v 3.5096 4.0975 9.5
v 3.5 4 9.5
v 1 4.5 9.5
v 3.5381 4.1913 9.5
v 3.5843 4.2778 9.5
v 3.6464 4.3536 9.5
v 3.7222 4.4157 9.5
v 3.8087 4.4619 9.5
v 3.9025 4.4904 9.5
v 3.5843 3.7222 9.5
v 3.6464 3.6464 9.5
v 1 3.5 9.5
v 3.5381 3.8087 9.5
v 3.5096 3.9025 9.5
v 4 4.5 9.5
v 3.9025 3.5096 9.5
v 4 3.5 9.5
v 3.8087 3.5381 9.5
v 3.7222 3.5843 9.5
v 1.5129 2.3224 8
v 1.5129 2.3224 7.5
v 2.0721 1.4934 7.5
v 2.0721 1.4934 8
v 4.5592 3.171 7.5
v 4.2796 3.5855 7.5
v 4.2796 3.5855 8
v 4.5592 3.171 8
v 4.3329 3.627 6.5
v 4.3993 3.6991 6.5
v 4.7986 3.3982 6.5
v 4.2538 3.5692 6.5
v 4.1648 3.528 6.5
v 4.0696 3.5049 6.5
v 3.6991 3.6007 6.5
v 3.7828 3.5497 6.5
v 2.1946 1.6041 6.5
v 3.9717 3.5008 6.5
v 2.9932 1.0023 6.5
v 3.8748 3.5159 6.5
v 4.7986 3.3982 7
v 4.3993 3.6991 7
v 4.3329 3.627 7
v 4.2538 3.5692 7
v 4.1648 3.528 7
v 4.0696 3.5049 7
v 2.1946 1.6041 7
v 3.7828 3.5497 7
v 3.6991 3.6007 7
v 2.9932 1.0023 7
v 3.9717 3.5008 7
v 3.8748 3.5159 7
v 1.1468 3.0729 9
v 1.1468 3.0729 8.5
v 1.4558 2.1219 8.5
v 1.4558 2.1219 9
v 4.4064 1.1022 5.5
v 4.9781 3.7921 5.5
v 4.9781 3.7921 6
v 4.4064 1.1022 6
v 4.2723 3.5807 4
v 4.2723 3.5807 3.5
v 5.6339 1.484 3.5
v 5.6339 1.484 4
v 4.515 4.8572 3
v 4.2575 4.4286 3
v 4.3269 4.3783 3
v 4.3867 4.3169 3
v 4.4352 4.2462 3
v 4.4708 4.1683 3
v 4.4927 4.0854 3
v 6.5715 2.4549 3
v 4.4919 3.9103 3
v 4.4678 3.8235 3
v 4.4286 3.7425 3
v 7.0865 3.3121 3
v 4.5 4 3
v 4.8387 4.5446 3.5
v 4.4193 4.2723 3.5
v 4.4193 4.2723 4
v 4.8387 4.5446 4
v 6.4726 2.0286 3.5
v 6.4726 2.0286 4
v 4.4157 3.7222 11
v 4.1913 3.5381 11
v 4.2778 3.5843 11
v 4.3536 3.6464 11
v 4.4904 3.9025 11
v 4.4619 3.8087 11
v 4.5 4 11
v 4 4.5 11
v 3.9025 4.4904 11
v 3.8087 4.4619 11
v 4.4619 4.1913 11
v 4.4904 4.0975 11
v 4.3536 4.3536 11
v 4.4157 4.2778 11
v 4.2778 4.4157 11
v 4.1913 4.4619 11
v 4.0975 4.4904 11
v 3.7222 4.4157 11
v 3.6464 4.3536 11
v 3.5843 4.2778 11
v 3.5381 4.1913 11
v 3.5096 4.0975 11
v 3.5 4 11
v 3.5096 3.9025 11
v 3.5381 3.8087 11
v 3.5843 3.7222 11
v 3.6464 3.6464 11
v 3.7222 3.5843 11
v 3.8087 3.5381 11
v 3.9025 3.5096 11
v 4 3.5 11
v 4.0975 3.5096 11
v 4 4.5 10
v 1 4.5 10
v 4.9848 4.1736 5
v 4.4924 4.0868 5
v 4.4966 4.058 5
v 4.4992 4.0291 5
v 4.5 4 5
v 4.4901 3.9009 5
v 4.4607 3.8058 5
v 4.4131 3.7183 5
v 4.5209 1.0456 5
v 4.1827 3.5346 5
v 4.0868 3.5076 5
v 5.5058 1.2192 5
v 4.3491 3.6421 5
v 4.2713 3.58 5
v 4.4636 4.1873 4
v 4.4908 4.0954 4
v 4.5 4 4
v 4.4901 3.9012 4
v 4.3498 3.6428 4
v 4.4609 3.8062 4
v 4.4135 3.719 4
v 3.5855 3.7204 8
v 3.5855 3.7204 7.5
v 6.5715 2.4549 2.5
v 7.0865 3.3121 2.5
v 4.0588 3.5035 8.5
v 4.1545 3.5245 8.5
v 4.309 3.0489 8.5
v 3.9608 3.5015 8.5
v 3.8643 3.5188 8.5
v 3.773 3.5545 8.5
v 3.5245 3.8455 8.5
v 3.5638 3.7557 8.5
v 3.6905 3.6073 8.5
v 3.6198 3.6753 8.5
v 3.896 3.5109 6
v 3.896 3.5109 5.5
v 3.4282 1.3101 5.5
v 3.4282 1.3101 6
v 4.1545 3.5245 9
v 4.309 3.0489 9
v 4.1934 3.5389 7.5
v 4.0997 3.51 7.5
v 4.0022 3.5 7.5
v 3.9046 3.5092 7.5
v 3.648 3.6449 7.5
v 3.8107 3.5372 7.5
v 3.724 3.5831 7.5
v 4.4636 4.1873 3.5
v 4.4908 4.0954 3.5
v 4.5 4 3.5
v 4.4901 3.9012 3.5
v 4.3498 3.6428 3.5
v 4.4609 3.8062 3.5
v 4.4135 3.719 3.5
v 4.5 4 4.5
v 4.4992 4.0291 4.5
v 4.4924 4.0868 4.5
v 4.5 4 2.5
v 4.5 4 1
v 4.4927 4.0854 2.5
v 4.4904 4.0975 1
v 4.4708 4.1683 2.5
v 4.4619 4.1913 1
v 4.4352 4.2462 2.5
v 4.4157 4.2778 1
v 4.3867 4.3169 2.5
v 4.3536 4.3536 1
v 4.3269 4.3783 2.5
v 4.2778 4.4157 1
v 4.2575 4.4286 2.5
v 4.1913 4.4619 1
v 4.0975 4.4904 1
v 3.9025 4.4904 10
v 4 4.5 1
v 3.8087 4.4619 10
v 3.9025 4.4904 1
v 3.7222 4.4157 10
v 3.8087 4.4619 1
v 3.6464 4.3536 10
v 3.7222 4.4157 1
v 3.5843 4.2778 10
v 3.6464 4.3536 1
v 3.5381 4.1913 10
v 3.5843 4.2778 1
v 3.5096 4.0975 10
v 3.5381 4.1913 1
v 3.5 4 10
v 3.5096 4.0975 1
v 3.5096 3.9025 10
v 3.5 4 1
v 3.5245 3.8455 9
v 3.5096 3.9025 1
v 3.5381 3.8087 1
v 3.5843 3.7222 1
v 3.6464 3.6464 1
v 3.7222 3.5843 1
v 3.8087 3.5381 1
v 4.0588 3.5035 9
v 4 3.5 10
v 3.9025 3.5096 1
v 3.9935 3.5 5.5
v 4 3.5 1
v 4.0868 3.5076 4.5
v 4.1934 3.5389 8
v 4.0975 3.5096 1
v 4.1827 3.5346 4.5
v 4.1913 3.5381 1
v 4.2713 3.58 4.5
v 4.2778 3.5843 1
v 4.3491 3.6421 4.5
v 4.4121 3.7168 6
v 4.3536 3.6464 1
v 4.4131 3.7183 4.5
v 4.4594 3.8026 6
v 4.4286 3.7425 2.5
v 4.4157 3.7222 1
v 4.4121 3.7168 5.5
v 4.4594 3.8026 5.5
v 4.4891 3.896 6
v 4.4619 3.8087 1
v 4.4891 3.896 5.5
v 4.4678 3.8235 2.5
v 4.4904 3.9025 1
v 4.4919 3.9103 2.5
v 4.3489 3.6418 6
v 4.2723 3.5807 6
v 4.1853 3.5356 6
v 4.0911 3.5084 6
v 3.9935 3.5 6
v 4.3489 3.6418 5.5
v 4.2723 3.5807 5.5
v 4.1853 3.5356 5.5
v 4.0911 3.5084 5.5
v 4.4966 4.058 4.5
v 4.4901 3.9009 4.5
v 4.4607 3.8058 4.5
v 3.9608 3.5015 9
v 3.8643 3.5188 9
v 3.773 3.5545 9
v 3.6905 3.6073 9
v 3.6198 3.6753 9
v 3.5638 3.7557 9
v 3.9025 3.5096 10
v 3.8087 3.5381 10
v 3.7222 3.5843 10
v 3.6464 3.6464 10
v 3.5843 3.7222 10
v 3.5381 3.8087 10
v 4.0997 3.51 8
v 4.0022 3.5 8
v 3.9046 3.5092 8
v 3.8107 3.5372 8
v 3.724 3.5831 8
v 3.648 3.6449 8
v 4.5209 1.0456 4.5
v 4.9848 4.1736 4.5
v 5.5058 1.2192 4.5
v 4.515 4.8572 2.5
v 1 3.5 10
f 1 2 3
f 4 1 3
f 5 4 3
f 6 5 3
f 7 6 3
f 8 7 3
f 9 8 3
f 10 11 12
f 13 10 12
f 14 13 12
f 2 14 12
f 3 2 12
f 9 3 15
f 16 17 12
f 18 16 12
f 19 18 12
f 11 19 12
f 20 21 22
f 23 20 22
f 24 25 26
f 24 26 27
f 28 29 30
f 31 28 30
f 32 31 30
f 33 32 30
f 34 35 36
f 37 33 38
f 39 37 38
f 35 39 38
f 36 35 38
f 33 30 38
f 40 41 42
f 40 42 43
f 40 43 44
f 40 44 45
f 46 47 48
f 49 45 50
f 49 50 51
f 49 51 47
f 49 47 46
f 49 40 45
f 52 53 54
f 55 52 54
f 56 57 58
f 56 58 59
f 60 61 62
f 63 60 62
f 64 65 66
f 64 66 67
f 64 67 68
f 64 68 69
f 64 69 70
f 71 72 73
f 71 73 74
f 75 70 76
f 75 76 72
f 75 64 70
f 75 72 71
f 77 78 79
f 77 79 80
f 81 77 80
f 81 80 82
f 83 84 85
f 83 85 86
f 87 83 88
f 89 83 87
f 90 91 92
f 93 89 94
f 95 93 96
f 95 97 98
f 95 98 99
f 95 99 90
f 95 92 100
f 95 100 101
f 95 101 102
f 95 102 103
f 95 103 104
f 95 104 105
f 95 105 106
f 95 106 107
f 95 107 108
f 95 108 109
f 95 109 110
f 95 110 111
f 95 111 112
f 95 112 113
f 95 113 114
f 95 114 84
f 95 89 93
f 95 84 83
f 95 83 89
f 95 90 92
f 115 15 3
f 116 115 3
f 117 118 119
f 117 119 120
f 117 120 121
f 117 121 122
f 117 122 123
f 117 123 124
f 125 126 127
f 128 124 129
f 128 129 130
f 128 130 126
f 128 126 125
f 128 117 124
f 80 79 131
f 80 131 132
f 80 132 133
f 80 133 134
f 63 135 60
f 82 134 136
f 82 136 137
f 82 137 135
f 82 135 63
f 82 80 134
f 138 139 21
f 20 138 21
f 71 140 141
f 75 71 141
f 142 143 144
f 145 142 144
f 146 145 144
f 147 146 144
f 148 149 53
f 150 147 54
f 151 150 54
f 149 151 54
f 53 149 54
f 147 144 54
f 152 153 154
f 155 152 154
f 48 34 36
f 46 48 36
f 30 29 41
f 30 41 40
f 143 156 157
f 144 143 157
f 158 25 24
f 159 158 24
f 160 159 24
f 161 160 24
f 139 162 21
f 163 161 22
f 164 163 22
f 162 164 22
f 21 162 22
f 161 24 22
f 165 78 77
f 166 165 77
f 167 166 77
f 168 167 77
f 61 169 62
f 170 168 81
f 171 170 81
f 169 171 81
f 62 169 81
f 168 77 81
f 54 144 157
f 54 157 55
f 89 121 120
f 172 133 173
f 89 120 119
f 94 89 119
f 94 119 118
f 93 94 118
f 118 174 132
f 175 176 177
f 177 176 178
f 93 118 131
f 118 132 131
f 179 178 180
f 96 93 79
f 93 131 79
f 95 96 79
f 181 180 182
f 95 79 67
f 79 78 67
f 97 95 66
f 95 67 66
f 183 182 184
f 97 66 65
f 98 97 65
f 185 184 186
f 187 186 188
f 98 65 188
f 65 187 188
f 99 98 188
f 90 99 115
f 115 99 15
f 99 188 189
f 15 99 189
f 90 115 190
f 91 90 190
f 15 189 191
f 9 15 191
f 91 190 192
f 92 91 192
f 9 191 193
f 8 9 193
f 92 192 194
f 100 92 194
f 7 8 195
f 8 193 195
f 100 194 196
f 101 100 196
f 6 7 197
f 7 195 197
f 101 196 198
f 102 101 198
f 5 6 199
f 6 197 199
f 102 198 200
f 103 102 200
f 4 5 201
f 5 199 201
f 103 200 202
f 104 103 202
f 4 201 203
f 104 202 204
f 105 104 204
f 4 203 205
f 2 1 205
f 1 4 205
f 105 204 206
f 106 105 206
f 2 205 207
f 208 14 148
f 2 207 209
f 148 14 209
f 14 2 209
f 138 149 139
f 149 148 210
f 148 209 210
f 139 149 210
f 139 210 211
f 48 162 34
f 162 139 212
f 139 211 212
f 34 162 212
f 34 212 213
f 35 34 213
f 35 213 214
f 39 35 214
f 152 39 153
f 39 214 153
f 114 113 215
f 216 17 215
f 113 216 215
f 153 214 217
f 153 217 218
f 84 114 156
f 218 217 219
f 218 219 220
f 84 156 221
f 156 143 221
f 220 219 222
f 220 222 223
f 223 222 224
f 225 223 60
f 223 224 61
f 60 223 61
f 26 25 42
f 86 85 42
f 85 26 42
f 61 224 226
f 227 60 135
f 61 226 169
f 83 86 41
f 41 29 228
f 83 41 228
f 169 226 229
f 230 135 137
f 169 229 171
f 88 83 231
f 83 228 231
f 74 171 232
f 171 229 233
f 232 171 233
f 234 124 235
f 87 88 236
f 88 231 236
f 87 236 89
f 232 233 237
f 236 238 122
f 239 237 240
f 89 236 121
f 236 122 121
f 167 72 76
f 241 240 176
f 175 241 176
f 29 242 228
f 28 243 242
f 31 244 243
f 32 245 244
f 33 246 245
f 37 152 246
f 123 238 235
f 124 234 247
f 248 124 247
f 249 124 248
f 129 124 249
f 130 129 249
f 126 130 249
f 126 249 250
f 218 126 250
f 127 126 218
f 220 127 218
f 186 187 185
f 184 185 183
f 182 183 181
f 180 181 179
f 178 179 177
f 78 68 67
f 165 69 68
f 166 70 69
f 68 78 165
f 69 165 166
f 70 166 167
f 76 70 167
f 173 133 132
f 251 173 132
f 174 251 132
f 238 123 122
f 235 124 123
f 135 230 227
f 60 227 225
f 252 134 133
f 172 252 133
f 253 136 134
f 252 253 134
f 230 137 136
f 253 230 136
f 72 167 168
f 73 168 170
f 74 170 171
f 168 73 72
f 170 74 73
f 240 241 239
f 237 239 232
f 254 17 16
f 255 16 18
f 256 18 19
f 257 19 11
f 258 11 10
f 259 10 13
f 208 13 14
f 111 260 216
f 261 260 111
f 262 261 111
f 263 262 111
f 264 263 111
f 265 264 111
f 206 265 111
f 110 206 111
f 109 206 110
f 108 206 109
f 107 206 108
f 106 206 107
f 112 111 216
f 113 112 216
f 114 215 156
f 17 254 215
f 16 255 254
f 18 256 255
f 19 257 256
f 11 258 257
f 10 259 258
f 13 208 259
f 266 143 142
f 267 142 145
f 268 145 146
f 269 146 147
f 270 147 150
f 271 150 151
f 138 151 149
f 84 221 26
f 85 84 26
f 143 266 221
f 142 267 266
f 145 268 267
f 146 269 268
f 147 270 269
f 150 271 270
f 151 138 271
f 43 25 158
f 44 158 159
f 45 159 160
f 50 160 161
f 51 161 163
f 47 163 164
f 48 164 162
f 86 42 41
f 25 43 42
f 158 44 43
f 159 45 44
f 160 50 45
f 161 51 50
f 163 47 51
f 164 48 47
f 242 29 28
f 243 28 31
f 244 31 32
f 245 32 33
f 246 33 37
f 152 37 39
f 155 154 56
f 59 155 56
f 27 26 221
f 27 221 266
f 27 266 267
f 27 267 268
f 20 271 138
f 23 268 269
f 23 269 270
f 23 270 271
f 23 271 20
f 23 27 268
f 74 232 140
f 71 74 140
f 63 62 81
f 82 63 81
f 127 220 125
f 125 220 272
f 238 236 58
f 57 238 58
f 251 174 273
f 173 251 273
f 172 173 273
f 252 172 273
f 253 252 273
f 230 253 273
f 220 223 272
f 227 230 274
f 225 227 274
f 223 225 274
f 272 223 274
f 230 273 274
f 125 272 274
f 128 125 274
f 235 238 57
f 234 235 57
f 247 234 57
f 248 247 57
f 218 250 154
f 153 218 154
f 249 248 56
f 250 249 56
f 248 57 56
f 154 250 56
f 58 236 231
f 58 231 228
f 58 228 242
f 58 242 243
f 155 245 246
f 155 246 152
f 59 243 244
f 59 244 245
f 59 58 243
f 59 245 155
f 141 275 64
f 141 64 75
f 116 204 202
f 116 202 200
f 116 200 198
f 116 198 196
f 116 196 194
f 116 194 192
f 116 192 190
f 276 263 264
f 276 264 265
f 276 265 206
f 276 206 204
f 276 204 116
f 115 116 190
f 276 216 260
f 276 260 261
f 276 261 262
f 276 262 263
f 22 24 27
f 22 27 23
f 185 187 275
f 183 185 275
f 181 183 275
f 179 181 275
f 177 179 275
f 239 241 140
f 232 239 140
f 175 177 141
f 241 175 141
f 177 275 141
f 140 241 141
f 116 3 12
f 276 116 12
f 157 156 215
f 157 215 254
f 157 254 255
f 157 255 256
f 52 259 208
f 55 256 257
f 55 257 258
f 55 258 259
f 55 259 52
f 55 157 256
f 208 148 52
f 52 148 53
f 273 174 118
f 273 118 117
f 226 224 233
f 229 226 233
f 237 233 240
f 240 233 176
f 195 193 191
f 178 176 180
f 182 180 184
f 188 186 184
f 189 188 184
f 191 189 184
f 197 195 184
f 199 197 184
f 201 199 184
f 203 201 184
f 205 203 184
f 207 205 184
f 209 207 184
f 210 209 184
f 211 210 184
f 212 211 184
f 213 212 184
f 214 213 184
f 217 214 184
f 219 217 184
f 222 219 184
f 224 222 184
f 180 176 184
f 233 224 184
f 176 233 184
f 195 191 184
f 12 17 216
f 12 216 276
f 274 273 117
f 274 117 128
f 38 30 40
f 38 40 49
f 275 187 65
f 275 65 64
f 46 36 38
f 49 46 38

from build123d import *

# Parameters (mm, degrees)
BOX103_W               = 3
BOX103_H               = 1
BOX103_DEPTH           = 0.5
BOX103_PLACEMENT_ANGLE = 31
BOX104_W               = 3
BOX104_H               = 1
BOX104_DEPTH           = 0.5
BOX104_PLACEMENT_ANGLE = 57
BOX105_W               = 3
BOX105_H               = 1
BOX105_DEPTH           = 0.5
BOX105_PLACEMENT_ANGLE = 80
BOX106_W               = 2.75
BOX106_H               = 1
BOX106_DEPTH           = 0.5
BOX106_PLACEMENT_ANGLE = 102
BOX107_W               = 3
BOX107_H               = 1
BOX107_DEPTH           = 0.5
BOX107_PLACEMENT_ANGLE = 233
BOX108_W               = 3
BOX108_H               = 1
BOX108_DEPTH           = 0.5
BOX108_PLACEMENT_ANGLE = 214
BOX109_W               = 3
BOX109_H               = 1
BOX109_DEPTH           = 0.5
BOX109_PLACEMENT_ANGLE = 198
BOX110_W               = 3
BOX110_H               = 1
BOX110_DEPTH           = 0.5
CYLINDER005_R          = 0.5
CYLINDER005_DEPTH      = 10


with BuildPart() as box103:
    # Box103 → Box103 (new body)
    with BuildSketch(Plane.XY):
        with Locations((1.5, 0.5)):
            Rectangle(BOX103_W, BOX103_H)
    extrude(amount=BOX103_DEPTH)


with BuildPart() as box103_1:
    # Box103 placement: moved
    add(box103.part.moved(Location((4, 4, 2.5))).rotate(Axis((4, 4, 2.5), (0, 0, -1)), BOX103_PLACEMENT_ANGLE))


with BuildPart() as box104:
    # Box104 → Box104 (new body)
    with BuildSketch(Plane.XY):
        with Locations((1.5, 0.5)):
            Rectangle(BOX104_W, BOX104_H)
    extrude(amount=BOX104_DEPTH)


with BuildPart() as box104_1:
    # Box104 placement: moved
    add(box104.part.moved(Location((4, 4, 3.5))).rotate(Axis((4, 4, 3.5), (0, 0, -1)), BOX104_PLACEMENT_ANGLE))


with BuildPart() as box105:
    # Box105 → Box105 (new body)
    with BuildSketch(Plane.XY):
        with Locations((1.5, 0.5)):
            Rectangle(BOX105_W, BOX105_H)
    extrude(amount=BOX105_DEPTH)


with BuildPart() as box105_1:
    # Box105 placement: moved
    add(box105.part.moved(Location((4, 4, 4.5))).rotate(Axis((4, 4, 4.5), (0, 0, -1)), BOX105_PLACEMENT_ANGLE))


with BuildPart() as box106:
    # Box106 → Box106 (new body)
    with BuildSketch(Plane.XY):
        with Locations((1.375, 0.5)):
            Rectangle(BOX106_W, BOX106_H)
    extrude(amount=BOX106_DEPTH)


with BuildPart() as box106_1:
    # Box106 placement: moved
    add(box106.part.moved(Location((4, 4, 5.5))).rotate(Axis((4, 4, 5.5), (0, 0, -1)), BOX106_PLACEMENT_ANGLE))


with BuildPart() as box107:
    # Box107 → Box107 (new body)
    with BuildSketch(Plane.XY):
        with Locations((1.5, 0.5)):
            Rectangle(BOX107_W, BOX107_H)
    extrude(amount=BOX107_DEPTH)


with BuildPart() as box107_1:
    # Box107 placement: moved
    add(box107.part.moved(Location((4, 4, 6.5))).rotate(Axis((4, 4, 6.5), (0, 0, 1)), BOX107_PLACEMENT_ANGLE))


with BuildPart() as box108:
    # Box108 → Box108 (new body)
    with BuildSketch(Plane.XY):
        with Locations((1.5, 0.5)):
            Rectangle(BOX108_W, BOX108_H)
    extrude(amount=BOX108_DEPTH)


with BuildPart() as box108_1:
    # Box108 placement: moved
    add(box108.part.moved(Location((4, 4, 7.5))).rotate(Axis((4, 4, 7.5), (0, 0, 1)), BOX108_PLACEMENT_ANGLE))


with BuildPart() as box109:
    # Box109 → Box109 (new body)
    with BuildSketch(Plane.XY):
        with Locations((1.5, 0.5)):
            Rectangle(BOX109_W, BOX109_H)
    extrude(amount=BOX109_DEPTH)


with BuildPart() as box109_1:
    # Box109 placement: moved
    add(box109.part.moved(Location((4, 4, 8.5))).rotate(Axis((4, 4, 8.5), (0, 0, 1)), BOX109_PLACEMENT_ANGLE))


with BuildPart() as box110:
    # Box110 → Box110 (new body)
    with BuildSketch(Plane(origin=(4, 4.5, 9.5), x_dir=(-1, 0, 0), z_dir=(0, 0, 1))):
        with Locations((1.5, 0.5)):
            Rectangle(BOX110_W, BOX110_H)
    extrude(amount=BOX110_DEPTH)


with BuildPart() as fusion051:
    # Cylinder005 → Cylinder005 (new body)
    with BuildSketch(Plane(origin=(4, 4, 1), x_dir=(1, 0, 0), z_dir=(0, 0, 1))):
        Circle(CYLINDER005_R)
    extrude(amount=CYLINDER005_DEPTH)

    # Fusion044: union Box110
    add(box110.part)

    # Fusion045: union Box109
    add(box109_1.part)

    # Fusion046: union Box108
    add(box108_1.part)

    # Fusion047: union Box107
    add(box107_1.part)

    # Fusion048: union Box106
    add(box106_1.part)

    # Fusion049: union Box105
    add(box105_1.part)

    # Fusion050: union Box104
    add(box104_1.part)

    # Fusion051: union Box103
    add(box103_1.part)


solid = fusion051.part
